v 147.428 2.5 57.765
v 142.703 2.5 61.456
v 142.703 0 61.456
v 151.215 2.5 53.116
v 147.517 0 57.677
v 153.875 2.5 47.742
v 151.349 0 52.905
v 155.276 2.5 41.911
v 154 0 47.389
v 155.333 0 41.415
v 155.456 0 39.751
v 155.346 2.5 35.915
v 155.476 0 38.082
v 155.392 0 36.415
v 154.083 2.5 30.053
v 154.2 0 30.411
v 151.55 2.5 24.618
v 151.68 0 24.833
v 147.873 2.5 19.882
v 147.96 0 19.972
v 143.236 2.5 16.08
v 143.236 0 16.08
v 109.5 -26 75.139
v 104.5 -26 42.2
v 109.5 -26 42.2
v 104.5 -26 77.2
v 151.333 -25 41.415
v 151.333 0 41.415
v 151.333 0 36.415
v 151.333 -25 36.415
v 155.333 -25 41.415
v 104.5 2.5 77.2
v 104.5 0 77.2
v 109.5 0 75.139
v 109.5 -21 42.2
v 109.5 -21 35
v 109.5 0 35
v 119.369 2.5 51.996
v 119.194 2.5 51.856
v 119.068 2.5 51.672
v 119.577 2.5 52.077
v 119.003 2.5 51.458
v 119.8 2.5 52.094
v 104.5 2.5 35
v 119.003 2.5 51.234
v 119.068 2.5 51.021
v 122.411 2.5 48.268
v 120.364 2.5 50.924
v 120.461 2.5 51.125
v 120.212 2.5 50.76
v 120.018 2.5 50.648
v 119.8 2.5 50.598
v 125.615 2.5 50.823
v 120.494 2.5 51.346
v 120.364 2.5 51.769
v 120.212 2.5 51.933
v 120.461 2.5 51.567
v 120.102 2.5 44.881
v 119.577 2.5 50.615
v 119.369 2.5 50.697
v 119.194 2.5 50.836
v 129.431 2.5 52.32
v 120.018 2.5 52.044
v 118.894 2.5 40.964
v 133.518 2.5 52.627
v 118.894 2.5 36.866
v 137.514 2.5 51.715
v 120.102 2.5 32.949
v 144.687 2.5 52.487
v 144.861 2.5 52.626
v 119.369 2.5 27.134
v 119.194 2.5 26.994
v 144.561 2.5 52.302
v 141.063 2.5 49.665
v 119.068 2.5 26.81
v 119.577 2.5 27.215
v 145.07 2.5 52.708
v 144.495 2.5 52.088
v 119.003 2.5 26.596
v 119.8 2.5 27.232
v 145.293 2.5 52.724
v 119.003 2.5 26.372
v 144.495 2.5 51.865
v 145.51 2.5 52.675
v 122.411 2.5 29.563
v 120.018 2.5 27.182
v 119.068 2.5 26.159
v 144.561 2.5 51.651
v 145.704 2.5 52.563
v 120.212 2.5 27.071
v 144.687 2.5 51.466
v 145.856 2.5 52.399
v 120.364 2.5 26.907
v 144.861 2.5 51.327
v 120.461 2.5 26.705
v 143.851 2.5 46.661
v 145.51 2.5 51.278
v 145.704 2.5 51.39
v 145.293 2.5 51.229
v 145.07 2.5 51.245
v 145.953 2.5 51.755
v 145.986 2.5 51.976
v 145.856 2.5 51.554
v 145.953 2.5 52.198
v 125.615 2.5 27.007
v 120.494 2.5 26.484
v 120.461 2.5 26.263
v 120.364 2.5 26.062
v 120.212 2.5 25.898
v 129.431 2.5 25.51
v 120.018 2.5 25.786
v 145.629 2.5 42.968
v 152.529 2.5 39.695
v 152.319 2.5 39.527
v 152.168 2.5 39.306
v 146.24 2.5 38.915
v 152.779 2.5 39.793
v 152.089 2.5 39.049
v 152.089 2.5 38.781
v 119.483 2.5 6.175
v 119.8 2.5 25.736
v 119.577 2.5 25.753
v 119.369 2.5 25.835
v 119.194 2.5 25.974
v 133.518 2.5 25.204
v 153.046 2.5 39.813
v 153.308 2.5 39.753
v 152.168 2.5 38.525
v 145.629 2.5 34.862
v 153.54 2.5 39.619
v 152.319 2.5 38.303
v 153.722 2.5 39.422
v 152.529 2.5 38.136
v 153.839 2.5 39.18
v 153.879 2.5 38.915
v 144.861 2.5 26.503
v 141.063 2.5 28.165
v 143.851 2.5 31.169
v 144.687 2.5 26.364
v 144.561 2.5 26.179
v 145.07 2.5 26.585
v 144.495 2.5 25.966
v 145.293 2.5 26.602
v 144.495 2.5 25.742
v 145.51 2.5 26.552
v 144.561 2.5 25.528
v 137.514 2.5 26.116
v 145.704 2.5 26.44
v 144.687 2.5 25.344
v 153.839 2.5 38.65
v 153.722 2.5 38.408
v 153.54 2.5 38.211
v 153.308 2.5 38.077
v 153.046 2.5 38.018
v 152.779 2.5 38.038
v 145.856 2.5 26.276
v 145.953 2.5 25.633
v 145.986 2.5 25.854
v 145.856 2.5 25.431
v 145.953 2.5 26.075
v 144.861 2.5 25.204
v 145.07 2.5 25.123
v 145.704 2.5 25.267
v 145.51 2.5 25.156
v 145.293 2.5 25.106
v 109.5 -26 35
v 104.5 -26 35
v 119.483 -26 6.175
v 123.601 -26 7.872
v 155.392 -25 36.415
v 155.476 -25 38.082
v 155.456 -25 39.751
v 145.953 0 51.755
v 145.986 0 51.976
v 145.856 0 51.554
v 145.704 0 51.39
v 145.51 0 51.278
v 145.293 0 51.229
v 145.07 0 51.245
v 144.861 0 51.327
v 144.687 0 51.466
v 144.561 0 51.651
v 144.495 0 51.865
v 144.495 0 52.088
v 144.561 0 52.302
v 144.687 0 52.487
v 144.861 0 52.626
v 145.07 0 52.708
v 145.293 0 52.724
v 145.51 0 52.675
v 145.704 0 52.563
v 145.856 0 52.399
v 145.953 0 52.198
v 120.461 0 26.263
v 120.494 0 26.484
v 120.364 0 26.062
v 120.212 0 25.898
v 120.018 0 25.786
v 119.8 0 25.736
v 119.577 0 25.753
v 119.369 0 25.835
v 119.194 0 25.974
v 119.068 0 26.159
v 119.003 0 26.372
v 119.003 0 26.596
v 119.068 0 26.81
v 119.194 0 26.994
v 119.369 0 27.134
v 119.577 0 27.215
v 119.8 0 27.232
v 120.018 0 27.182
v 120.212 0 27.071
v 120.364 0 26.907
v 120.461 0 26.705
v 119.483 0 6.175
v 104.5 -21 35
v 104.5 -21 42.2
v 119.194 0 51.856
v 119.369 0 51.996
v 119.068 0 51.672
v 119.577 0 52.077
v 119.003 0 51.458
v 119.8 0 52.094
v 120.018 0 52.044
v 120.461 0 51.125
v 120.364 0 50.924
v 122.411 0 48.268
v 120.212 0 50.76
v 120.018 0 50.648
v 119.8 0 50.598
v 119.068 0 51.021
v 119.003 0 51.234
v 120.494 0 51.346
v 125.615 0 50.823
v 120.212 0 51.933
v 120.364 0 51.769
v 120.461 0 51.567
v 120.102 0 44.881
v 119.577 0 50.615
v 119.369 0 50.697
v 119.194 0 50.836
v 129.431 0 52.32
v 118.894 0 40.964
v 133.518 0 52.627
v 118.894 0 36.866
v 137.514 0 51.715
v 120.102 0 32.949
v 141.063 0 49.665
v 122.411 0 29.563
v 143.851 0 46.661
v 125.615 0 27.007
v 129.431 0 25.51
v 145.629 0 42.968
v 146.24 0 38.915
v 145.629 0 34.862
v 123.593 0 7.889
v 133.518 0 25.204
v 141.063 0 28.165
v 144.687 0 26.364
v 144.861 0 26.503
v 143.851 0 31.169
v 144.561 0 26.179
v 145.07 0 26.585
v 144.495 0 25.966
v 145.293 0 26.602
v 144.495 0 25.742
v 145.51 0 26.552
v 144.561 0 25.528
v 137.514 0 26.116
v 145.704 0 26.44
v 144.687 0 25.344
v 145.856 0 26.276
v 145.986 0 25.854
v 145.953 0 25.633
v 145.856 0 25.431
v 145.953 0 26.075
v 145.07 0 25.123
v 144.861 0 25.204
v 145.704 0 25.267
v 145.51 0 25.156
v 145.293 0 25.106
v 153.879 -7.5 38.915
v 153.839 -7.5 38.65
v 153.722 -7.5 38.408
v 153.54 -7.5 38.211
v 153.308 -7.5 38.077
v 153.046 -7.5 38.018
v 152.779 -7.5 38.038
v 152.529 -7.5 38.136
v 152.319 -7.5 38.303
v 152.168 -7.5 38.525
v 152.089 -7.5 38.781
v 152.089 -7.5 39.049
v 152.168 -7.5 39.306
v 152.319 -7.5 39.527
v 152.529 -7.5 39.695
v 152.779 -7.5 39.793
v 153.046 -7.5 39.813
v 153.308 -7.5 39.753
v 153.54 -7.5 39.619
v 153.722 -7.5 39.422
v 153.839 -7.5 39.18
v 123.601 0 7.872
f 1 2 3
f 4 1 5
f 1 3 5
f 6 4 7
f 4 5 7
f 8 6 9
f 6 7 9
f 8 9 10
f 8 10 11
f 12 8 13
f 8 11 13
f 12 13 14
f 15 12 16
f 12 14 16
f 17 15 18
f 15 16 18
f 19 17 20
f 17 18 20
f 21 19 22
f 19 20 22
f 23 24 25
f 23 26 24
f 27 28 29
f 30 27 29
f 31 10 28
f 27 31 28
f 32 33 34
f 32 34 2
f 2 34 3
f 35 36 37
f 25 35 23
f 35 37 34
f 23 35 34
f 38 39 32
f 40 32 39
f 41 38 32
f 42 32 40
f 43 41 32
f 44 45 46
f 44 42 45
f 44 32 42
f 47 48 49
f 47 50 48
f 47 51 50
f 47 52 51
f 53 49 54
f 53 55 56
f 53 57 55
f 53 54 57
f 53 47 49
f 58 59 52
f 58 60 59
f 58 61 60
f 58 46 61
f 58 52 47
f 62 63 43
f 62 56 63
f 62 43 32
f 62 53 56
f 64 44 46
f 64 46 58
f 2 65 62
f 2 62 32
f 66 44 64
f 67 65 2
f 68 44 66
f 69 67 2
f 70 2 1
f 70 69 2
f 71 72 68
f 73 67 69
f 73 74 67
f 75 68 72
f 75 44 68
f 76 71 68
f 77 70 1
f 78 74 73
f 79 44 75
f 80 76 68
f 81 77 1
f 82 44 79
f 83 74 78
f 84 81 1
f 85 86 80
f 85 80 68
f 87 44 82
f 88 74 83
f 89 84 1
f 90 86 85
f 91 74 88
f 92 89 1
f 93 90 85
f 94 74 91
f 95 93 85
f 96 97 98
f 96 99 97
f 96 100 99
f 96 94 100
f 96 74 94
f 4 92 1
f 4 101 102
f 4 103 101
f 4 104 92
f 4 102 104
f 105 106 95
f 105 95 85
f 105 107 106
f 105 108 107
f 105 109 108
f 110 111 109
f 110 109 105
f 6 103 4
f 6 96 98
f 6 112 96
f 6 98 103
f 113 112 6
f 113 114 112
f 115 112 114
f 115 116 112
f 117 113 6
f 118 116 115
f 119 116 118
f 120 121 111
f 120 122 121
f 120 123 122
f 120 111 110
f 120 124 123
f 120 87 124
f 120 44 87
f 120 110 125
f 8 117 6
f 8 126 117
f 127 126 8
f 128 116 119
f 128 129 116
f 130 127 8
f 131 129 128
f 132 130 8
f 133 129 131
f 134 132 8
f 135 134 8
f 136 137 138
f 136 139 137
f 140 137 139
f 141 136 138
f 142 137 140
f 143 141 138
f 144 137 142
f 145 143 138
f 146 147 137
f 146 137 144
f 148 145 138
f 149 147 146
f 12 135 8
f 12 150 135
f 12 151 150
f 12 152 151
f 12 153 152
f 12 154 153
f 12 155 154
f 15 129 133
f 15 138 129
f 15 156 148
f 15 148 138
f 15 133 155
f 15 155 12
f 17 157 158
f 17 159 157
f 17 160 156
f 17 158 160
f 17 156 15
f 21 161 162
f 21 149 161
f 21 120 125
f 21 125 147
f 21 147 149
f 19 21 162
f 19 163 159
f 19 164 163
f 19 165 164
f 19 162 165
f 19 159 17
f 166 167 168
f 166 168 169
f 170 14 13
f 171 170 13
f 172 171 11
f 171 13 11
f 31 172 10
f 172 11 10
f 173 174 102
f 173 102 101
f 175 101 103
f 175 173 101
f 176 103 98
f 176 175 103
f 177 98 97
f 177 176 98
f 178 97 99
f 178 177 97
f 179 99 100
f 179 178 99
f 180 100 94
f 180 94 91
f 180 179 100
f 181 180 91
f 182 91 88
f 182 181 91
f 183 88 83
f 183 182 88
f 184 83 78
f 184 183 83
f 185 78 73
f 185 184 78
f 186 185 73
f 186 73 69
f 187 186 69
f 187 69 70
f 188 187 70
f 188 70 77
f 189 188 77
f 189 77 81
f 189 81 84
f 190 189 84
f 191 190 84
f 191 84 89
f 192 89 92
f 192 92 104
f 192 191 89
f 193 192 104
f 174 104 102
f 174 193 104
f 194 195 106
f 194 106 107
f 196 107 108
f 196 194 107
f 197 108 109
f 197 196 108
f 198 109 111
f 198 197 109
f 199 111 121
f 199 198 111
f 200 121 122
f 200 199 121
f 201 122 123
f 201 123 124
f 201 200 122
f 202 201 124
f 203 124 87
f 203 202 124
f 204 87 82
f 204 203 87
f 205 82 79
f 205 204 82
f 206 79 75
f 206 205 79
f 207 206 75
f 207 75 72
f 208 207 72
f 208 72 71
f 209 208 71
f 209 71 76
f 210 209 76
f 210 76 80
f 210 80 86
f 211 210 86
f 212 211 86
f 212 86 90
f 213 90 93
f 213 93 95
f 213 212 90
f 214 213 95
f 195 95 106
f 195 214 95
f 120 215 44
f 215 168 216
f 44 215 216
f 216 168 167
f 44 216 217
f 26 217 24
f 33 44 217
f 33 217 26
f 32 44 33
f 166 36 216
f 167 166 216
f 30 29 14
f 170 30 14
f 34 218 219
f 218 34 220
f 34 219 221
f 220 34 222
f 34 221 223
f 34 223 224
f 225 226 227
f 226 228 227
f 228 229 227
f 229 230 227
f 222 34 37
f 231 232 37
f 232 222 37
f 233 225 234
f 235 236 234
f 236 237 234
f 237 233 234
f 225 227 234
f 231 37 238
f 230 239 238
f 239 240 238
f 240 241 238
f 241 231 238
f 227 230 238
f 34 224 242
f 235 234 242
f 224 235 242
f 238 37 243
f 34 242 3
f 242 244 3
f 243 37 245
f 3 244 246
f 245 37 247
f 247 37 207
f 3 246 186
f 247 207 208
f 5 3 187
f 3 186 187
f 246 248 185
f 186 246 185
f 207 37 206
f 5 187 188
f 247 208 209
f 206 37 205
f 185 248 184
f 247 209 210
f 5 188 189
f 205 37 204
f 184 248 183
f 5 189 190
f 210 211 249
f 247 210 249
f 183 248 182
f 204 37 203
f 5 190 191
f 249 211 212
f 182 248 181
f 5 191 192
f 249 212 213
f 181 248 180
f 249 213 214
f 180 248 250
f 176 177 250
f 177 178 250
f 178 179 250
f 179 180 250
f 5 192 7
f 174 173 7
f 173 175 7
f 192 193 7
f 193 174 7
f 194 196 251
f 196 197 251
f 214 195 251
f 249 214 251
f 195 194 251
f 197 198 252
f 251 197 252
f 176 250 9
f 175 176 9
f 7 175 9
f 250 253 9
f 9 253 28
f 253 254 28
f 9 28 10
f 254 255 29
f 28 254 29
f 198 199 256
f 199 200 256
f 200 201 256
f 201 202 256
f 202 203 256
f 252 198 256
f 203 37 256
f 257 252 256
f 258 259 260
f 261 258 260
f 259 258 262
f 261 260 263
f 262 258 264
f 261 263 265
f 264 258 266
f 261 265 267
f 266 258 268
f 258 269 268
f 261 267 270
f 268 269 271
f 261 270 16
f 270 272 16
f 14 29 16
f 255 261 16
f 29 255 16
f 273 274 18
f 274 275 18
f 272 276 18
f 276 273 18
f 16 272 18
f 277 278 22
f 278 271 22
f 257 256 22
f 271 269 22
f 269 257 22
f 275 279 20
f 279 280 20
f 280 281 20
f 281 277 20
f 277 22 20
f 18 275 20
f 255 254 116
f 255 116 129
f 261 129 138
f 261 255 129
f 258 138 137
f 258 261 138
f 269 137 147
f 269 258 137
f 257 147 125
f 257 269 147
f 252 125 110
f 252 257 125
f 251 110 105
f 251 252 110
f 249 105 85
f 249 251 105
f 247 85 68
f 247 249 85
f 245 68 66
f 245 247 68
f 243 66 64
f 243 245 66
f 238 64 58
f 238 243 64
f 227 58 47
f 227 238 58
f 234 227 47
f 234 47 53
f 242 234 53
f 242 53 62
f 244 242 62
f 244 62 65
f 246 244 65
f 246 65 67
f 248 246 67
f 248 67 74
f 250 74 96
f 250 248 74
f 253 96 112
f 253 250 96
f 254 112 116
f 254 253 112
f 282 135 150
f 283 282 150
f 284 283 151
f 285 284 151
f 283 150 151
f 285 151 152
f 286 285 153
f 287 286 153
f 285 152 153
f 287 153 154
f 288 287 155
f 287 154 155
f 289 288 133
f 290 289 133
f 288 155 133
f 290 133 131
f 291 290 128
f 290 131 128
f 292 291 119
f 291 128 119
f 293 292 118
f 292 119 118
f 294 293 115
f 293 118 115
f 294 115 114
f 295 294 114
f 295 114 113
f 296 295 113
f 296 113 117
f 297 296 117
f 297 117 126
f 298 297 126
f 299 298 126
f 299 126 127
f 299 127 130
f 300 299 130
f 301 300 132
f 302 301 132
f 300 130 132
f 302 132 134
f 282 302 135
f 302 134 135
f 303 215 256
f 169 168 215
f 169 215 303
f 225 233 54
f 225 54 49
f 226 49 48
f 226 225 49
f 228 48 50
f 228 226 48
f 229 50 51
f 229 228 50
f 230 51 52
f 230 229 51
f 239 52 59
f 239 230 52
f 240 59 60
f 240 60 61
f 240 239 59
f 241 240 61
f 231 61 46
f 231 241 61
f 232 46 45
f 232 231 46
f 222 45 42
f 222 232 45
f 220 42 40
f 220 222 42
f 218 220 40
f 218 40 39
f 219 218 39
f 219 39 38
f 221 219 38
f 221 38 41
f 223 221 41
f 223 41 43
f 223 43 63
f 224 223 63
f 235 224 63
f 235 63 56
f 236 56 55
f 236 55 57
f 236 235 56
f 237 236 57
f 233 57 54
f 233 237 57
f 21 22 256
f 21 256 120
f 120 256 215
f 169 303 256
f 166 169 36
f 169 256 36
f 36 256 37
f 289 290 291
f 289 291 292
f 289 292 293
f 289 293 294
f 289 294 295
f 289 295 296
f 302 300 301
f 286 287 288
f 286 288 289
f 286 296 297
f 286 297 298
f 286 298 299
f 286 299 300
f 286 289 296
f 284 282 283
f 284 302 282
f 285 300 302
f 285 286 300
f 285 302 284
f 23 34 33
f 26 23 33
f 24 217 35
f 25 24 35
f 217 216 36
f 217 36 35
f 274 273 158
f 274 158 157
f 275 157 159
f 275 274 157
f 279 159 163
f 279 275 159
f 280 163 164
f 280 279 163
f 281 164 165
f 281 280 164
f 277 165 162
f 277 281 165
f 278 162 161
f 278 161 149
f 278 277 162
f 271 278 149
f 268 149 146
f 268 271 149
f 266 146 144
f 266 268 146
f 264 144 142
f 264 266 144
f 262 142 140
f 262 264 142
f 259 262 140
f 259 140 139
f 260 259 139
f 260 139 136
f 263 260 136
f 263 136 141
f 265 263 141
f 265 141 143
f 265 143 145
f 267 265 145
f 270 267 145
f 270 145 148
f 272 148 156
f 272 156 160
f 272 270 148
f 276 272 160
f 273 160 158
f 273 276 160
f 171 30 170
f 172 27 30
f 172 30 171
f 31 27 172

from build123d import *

# Parameters (mm, degrees)
SKETCH2_R           = 13.75
SKETCH2_R_2         = 0.75
BOSS_EXTRUDE1_DEPTH = 2.5
BOSS_EXTRUDE2_DEPTH = 26
SKETCH5_W           = 7.2
SKETCH5_H           = 21
BOSS_EXTRUDE5_DEPTH = 5
BOSS_EXTRUDE6_DEPTH = 25
SKETCH7_R           = 0.9
CUT_EXTRUDE1_DEPTH  = 10


with BuildPart() as part:
    # Sketch2 → Boss-Extrude1 (new body)
    with BuildSketch(Plane(origin=(0, 0, 0), x_dir=(1, 0, 0), z_dir=(0, 1, 0))):
        with BuildLine():
            Line((104.5, -77.2), (142.702591635, -61.456260882))
            ThreePointArc((142.702591635, -61.456260882), (155.478803114, -38.915145373), (143.235603671, -16.080138573))
            Line((143.235603671, -16.080138573), (119.48341621, -6.174842748))
            Line((119.48341621, -6.174842748), (104.5, -35))
            Line((104.5, -35), (104.5, -77.2))
        make_face()
        with Locations((132.490326991, -38.915145373)):
            Circle(SKETCH2_R, mode=Mode.SUBTRACT)
        with Locations((145.236491006, -25.853835985)):
            Circle(SKETCH2_R_2, mode=Mode.SUBTRACT)
        with Locations((119.744162977, -51.346164015)):
            Circle(SKETCH2_R_2, mode=Mode.SUBTRACT)
        with Locations((119.744162977, -26.484126731)):
            Circle(SKETCH2_R_2, mode=Mode.SUBTRACT)
        with Locations((145.236491006, -51.97645476)):
            Circle(SKETCH2_R_2, mode=Mode.SUBTRACT)
    extrude(amount=BOSS_EXTRUDE1_DEPTH)

    # Sketch3 → Boss-Extrude2 (add)
    with BuildSketch(Plane.XZ):
        Polygon((104.5, 42.2), (109.5, 42.2), (109.5, 75.139440959), (104.5, 77.2), align=None)
        Polygon((109.5, 35), (104.5, 35), (119.48341621, 6.174842748), (123.601295817, 7.871869559), align=None)
    extrude(amount=BOSS_EXTRUDE2_DEPTH)

    # Sketch5 → Boss-Extrude5 (add)
    with BuildSketch(Plane.ZY.offset(-104.5)):
        with Locations((38.6, -10.5)):
            Rectangle(SKETCH5_W, SKETCH5_H)
    extrude(amount=-BOSS_EXTRUDE5_DEPTH)

    # Sketch6 → Boss-Extrude6 (add)
    with BuildSketch(Plane.XZ):
        with BuildLine():
            Line((155.332558904, 41.415145373), (151.332558904, 41.415145373))
            Line((151.332558904, 41.415145373), (151.332558904, 36.415145373))
            Line((151.332558904, 36.415145373), (155.391548261, 36.415145373))
            ThreePointArc((155.391548261, 36.415145373), (155.478786901, 38.916522577), (155.332558904, 41.415145373))
        make_face()
    extrude(amount=BOSS_EXTRUDE6_DEPTH)

    # Sketch7 → Cut-Extrude1 (cut)
    with BuildSketch(Plane(origin=(0, 2.5, 0), x_dir=(1, 0, 0), z_dir=(0, 1, 0))):
        with Locations((152.978803114, -38.915145373)):
            Circle(SKETCH7_R)
    extrude(amount=-CUT_EXTRUDE1_DEPTH, mode=Mode.SUBTRACT)


solid = part.part
